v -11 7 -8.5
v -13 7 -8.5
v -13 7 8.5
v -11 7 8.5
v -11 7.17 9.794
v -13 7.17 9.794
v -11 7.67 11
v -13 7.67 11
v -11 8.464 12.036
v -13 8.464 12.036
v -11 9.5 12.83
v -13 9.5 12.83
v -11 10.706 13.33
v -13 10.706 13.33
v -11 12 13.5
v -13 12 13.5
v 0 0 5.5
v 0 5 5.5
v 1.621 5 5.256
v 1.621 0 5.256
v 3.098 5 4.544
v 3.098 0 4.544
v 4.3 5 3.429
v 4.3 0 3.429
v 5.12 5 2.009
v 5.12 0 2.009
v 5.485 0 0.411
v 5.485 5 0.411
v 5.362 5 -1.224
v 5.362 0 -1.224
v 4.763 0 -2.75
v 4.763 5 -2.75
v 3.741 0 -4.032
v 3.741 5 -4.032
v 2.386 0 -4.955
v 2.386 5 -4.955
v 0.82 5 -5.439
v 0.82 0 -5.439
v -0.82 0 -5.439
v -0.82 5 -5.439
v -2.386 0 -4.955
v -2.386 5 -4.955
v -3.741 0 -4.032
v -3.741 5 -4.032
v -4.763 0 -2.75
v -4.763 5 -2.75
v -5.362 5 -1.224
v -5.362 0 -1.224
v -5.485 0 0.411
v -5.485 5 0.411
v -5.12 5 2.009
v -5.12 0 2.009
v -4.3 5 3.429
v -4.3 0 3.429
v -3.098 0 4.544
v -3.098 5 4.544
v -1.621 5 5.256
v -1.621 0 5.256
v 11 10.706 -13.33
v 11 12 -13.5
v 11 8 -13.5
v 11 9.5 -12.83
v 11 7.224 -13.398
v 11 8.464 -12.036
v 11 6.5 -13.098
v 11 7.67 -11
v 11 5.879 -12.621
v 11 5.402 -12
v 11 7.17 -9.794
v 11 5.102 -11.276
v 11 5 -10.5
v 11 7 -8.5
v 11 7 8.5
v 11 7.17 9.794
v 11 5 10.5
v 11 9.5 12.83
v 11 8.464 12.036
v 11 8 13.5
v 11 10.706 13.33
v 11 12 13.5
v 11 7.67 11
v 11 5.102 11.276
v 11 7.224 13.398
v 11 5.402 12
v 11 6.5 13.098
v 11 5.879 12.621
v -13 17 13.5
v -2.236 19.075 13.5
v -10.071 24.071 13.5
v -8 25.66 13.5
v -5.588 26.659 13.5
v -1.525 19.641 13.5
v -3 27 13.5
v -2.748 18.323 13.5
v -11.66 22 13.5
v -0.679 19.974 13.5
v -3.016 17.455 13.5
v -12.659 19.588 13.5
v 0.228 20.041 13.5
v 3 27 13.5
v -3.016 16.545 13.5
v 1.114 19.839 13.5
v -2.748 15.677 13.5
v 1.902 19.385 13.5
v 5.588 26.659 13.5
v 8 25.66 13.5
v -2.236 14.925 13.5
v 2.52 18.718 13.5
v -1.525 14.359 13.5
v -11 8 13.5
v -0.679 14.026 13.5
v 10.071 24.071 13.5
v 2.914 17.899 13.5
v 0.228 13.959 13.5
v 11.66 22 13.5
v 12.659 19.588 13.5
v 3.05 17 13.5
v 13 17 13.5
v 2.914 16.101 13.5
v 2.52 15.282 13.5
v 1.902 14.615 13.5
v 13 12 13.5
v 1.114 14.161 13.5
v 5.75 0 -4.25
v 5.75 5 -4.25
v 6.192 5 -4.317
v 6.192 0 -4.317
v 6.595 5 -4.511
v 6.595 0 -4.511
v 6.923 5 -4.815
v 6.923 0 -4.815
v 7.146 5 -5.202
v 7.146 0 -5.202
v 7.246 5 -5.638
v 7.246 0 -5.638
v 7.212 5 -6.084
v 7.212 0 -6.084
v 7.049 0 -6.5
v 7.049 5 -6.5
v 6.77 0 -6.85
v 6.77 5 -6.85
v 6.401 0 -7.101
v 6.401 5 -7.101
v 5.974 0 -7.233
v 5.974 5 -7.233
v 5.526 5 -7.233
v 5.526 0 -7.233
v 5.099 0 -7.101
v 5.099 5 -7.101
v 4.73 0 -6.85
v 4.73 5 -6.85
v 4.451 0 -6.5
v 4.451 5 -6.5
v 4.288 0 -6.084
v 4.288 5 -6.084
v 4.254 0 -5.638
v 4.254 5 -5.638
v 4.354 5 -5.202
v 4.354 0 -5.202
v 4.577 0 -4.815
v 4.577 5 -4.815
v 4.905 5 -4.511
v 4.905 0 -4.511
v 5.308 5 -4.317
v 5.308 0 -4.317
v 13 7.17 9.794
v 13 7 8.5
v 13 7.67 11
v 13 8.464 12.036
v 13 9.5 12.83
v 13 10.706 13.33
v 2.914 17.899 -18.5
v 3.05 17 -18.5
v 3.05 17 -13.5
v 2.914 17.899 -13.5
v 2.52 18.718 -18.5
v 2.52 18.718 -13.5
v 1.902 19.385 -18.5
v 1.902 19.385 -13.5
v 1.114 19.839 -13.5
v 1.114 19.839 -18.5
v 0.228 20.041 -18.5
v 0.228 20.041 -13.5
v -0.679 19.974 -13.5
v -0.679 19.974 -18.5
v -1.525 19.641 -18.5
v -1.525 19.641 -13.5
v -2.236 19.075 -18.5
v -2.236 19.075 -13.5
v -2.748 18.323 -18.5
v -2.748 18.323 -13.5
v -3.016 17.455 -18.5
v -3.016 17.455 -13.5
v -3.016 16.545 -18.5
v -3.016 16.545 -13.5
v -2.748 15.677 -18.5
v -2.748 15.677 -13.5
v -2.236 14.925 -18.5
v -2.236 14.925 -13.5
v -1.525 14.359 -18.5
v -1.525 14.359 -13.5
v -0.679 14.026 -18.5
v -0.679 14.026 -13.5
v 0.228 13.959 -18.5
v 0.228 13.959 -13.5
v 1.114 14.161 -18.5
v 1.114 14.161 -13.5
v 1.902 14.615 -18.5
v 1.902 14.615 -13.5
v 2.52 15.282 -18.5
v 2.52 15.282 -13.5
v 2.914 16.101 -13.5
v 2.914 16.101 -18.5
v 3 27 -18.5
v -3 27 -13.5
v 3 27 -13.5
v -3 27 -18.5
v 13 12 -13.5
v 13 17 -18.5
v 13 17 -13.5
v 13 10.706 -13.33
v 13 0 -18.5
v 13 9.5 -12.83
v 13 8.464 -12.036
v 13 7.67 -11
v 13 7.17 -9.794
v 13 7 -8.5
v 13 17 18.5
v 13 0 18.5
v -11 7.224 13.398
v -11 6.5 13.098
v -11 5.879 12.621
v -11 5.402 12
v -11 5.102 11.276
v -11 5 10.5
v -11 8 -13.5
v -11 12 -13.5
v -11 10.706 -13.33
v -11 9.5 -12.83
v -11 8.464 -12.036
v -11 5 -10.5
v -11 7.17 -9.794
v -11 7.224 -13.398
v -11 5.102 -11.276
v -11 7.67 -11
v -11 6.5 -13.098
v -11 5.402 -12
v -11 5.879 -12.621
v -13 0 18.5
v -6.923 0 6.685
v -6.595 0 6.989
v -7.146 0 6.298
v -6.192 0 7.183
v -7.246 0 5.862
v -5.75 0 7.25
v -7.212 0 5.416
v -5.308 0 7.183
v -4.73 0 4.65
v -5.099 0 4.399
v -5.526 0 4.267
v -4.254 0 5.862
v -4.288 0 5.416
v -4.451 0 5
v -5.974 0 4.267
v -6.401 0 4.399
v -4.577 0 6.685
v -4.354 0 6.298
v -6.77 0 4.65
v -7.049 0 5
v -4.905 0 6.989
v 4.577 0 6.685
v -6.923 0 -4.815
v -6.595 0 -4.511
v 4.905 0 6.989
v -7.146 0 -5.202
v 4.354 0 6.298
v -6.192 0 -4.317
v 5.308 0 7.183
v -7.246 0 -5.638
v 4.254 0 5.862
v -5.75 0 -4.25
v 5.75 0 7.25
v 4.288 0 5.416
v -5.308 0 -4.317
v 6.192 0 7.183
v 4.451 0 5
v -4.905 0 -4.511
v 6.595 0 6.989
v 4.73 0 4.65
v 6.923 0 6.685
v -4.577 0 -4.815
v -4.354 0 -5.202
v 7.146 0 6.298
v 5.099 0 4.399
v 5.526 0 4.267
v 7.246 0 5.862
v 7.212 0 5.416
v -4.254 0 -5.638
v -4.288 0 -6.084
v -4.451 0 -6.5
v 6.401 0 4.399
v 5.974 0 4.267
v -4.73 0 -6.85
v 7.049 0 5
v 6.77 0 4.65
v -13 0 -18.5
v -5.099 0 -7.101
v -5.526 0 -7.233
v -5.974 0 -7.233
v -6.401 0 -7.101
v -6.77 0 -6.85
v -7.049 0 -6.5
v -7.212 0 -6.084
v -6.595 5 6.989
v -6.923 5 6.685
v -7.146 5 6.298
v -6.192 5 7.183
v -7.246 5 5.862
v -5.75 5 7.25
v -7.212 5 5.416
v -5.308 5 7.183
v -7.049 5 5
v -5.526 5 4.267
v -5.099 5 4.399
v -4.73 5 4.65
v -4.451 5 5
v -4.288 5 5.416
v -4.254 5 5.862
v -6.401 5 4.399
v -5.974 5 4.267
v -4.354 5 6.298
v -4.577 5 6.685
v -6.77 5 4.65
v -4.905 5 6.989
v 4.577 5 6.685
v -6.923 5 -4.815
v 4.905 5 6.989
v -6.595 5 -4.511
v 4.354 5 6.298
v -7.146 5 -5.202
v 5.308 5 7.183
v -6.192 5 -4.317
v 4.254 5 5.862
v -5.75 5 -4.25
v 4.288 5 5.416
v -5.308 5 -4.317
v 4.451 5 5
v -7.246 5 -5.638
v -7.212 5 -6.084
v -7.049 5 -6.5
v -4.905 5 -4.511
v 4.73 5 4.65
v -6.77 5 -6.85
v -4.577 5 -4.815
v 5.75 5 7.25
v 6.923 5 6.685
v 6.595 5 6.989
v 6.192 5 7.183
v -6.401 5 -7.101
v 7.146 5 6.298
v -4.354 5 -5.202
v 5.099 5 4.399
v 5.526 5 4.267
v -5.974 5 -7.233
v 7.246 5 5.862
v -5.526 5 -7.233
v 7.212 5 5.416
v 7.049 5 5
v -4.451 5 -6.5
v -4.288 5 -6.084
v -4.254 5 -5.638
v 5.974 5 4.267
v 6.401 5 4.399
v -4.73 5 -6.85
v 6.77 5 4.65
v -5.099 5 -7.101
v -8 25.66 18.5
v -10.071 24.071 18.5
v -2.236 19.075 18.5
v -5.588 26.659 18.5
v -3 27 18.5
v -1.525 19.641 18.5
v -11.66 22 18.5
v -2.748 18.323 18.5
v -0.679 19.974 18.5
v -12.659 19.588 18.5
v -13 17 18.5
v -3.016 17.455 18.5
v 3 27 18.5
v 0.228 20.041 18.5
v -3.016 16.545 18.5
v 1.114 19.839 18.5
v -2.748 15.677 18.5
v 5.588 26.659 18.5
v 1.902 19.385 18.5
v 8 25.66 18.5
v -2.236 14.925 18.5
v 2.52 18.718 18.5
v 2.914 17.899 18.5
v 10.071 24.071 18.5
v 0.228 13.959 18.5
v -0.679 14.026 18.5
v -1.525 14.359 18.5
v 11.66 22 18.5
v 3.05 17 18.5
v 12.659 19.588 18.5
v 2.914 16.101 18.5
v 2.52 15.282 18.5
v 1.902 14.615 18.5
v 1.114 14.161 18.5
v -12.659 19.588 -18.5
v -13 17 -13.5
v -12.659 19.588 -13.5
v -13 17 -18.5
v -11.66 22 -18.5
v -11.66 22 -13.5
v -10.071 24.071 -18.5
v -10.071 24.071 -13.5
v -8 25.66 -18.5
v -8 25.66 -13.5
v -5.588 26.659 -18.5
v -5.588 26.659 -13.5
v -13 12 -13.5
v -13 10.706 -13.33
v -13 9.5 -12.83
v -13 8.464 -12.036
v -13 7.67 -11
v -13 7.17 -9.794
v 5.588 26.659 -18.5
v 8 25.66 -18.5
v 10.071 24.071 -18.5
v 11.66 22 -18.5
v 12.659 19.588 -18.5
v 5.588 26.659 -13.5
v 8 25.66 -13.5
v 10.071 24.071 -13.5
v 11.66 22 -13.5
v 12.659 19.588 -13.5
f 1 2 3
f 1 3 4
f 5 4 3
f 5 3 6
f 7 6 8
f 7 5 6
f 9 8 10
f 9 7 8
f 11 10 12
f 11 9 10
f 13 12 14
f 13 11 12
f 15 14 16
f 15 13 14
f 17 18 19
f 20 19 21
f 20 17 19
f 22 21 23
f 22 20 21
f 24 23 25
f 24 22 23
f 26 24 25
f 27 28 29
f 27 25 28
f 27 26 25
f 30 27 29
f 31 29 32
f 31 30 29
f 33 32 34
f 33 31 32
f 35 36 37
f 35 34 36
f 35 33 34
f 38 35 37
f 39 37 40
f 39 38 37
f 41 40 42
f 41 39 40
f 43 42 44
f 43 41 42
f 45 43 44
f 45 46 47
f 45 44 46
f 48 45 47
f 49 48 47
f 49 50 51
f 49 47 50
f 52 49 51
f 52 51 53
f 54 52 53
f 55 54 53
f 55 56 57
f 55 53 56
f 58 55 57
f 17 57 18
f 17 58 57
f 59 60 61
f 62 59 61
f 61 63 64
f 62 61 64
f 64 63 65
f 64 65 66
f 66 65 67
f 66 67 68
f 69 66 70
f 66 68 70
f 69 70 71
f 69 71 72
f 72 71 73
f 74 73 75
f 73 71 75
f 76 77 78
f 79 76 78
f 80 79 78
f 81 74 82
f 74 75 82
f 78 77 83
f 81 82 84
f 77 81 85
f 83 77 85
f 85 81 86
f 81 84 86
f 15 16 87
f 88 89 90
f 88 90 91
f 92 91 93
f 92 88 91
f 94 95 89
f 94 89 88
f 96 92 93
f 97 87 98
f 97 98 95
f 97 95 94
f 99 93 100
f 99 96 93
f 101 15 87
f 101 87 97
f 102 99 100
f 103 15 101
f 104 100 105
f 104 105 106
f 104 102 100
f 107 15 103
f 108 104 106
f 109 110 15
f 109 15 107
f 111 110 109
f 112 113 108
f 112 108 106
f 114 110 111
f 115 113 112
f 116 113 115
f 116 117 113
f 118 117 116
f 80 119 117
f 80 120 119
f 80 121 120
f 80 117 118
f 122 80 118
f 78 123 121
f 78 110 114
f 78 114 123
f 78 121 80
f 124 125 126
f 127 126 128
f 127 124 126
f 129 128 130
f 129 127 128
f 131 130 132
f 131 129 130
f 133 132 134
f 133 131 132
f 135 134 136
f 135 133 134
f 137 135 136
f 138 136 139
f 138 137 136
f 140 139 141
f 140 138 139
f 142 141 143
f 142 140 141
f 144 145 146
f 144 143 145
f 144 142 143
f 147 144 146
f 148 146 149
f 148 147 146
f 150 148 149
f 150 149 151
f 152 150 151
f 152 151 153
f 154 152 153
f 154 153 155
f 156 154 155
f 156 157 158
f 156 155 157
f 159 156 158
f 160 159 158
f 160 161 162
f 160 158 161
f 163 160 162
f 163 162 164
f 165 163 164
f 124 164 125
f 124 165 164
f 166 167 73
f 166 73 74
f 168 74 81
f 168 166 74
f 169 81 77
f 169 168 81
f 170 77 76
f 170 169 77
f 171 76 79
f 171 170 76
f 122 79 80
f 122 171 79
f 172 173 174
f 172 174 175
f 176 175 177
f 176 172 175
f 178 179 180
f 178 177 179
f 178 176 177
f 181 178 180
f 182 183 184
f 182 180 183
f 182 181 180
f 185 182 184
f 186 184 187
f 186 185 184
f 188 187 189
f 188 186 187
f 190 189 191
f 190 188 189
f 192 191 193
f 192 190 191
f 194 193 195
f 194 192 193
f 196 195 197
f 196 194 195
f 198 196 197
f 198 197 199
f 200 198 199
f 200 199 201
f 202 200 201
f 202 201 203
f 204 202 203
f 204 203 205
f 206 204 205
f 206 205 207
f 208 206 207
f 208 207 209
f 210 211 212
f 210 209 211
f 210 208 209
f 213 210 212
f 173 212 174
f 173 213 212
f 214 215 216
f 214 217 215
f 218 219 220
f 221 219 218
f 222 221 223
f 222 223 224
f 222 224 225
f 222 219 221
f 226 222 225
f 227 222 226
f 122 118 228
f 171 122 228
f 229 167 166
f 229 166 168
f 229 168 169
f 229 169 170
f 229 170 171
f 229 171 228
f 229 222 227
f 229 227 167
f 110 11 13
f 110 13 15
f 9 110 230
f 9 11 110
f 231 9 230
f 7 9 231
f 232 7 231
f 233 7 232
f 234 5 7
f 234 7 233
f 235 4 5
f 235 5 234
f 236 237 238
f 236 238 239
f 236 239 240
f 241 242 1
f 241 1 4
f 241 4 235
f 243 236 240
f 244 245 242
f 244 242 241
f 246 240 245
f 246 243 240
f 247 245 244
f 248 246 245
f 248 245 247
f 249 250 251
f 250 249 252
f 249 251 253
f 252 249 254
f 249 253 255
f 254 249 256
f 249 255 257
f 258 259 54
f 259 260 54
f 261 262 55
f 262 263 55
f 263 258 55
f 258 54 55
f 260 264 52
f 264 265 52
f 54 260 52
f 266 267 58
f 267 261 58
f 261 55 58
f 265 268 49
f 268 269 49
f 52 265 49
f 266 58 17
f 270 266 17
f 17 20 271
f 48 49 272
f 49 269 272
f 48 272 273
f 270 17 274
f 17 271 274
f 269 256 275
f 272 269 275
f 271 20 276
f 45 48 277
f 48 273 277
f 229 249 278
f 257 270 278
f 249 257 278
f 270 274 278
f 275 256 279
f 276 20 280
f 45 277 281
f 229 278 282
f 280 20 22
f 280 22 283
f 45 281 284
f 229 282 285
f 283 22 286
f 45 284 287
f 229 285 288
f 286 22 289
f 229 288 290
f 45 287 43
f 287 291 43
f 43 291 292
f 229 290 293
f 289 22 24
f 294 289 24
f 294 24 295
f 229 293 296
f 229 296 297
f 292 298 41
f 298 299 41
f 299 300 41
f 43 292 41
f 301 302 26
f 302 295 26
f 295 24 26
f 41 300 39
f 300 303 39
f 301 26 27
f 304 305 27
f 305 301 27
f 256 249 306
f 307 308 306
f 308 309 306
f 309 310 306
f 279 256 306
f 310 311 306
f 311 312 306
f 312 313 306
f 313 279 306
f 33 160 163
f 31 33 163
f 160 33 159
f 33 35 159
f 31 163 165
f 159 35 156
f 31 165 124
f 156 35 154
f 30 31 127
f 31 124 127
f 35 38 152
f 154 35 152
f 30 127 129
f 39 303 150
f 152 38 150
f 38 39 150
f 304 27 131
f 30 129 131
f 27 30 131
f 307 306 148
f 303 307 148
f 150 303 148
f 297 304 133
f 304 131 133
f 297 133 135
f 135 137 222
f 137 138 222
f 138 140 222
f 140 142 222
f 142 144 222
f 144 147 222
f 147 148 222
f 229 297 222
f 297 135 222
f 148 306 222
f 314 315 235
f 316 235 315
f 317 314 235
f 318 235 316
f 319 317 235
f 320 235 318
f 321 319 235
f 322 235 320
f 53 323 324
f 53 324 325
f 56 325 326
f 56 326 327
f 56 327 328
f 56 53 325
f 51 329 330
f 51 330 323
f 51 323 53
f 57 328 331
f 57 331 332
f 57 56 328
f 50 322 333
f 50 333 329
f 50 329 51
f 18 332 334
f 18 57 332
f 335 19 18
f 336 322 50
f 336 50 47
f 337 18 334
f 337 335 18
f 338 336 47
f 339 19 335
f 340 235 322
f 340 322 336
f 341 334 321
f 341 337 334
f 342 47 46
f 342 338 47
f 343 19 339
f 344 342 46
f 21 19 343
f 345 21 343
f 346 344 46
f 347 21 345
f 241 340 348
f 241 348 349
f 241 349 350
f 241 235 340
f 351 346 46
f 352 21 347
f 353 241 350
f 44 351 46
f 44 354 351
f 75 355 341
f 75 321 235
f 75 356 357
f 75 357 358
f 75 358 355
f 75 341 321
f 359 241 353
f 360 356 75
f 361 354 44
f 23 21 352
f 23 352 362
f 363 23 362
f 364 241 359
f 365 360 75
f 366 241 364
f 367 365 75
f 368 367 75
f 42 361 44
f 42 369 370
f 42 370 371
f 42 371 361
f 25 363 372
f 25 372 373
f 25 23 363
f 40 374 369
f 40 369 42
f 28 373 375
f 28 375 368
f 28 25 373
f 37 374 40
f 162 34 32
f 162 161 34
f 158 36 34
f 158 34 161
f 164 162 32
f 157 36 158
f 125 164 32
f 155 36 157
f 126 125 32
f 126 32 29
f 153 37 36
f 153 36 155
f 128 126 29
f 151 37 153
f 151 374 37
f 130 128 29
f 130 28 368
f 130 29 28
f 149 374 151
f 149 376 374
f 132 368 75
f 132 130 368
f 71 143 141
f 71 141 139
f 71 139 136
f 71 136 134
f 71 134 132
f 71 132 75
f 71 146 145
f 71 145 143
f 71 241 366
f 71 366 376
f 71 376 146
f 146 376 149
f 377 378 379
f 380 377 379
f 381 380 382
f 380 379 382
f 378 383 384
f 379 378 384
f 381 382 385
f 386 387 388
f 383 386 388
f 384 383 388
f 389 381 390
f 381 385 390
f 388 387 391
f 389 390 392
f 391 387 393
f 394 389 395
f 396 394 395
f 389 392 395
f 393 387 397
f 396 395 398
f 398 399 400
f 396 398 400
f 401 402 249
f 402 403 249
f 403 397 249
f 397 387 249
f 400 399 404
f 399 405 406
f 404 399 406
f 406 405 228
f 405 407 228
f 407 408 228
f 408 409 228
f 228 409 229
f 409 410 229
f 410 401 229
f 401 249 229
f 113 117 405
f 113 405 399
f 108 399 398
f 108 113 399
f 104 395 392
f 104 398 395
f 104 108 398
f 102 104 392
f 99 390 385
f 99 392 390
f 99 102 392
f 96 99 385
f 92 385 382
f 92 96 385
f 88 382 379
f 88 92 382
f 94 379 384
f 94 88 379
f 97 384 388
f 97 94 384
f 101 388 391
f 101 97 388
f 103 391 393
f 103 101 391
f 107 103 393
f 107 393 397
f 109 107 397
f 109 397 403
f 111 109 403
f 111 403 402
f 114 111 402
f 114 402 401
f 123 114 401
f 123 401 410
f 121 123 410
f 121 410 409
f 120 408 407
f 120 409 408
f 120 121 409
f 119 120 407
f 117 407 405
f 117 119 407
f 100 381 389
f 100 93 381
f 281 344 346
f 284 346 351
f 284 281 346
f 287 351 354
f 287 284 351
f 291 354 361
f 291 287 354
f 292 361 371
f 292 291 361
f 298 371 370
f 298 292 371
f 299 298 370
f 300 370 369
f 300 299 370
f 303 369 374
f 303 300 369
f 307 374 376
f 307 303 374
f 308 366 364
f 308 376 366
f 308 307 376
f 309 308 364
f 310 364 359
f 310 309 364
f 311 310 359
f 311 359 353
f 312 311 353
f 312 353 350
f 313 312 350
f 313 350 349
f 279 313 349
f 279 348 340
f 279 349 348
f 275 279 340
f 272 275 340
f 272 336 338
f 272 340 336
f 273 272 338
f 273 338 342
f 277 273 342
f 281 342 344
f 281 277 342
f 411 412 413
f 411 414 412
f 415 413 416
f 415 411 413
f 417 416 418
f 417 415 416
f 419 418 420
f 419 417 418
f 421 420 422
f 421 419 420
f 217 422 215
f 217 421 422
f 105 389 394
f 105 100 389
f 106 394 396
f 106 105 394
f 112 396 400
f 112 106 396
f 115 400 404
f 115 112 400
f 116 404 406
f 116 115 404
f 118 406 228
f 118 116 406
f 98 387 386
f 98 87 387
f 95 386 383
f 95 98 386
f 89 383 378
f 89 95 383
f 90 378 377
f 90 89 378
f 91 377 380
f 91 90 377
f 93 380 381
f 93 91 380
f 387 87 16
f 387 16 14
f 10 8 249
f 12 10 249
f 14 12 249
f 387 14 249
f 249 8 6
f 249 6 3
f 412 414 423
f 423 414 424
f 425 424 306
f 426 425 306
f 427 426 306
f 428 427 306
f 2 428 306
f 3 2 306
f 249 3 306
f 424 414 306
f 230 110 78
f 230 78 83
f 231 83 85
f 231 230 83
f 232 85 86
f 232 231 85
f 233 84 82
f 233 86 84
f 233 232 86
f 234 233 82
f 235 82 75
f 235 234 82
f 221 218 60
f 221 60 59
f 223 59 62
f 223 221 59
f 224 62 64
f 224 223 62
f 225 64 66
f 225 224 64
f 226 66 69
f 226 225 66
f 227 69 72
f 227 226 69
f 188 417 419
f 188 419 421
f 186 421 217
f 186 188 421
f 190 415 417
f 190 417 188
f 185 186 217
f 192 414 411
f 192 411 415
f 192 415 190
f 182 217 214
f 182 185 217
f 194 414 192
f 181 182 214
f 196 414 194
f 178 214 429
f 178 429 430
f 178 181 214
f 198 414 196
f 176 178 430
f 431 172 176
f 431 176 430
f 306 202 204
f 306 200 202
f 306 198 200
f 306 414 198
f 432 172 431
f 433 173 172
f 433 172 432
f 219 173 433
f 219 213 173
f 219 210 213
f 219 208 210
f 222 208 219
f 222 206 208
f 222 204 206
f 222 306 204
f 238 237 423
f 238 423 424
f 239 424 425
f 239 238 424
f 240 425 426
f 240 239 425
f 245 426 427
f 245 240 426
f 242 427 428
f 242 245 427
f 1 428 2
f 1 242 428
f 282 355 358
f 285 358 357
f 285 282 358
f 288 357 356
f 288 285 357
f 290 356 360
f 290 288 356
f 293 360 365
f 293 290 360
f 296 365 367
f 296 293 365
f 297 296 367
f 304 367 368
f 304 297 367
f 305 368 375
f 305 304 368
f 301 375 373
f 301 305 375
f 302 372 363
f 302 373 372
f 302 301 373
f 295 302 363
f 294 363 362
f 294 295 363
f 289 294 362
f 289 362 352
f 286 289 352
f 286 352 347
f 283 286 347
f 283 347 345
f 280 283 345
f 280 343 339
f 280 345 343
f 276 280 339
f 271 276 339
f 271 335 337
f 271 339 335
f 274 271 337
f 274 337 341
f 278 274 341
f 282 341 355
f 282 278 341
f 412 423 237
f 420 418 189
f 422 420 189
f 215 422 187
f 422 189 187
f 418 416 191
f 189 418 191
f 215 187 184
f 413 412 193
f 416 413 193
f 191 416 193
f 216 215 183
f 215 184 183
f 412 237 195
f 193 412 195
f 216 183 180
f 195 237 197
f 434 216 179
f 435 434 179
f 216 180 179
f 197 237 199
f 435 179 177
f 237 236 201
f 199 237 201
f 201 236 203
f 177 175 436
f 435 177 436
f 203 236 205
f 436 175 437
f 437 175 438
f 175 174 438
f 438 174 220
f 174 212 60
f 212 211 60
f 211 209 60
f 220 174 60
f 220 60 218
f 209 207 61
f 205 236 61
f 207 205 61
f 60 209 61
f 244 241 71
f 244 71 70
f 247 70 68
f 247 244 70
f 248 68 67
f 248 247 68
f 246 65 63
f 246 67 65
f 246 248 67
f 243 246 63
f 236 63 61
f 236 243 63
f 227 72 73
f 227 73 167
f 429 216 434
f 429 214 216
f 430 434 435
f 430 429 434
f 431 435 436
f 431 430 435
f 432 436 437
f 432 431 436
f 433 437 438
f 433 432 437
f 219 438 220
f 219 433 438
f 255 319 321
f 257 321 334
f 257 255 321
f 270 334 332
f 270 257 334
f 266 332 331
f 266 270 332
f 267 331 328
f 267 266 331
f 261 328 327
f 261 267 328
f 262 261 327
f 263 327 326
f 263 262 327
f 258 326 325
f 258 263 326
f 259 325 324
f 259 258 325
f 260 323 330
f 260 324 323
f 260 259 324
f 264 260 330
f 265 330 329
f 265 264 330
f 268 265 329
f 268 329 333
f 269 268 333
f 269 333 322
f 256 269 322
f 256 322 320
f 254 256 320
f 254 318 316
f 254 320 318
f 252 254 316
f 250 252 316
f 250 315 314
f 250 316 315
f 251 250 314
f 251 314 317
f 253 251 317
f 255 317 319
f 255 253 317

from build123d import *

# Parameters (mm, degrees)
SKETCH1_W               = 26
SKETCH1_H               = 37
BOSS_EXTRUDE1_DEPTH     = 5
SKETCH2_R               = 1.5
SKETCH2_R_2             = 5.5
CUT_EXTRUDE1_DEPTH      = 24.157072354
SKETCH3_W               = 26
SKETCH3_H               = 5
BOSS_EXTRUDE2_DEPTH     = 27
CUT_EXTRUDE2_DEPTH      = 36.217183306
CUT_EXTRUDE2_DEPTH_BACK = 36.217183306
SKETCH4_R               = 3.05
FILLET1_R               = 10
FILLET2_R               = 3
SKETCH5_W               = 2
SKETCH5_H               = 37
BOSS_EXTRUDE3_DEPTH     = 7
FILLET3_R               = 5


with BuildPart() as part:
    # Sketch1 → Boss-Extrude1 (new body)
    with BuildSketch(Plane(origin=(0, 0, 0), x_dir=(1, 0, 0), z_dir=(0, 1, 0))):
        Rectangle(SKETCH1_W, SKETCH1_H)
    extrude(amount=BOSS_EXTRUDE1_DEPTH)

    # Sketch2 → Cut-Extrude1 (cut, through all)
    with BuildSketch(Plane(origin=(0, 0, 0), x_dir=(1, 0, 0), z_dir=(0, 1, 0))):
        with Locations(Location((-5.75, 5.75, 0), (0, 0, 270))):
            Circle(SKETCH2_R)
        with Locations(Location((0, 0, 0), (0, 0, 270))):
            Circle(SKETCH2_R_2)
        with Locations(Location((5.75, 5.75, 0), (0, 0, 270))):
            Circle(SKETCH2_R)
        with Locations(Location((5.75, -5.75, 0), (0, 0, 270))):
            Circle(SKETCH2_R)
        with Locations(Location((-5.75, -5.75, 0), (0, 0, 270))):
            Circle(SKETCH2_R)
    extrude(amount=CUT_EXTRUDE1_DEPTH, mode=Mode.SUBTRACT)

    # Sketch3 → Boss-Extrude2 (add)
    with BuildSketch(Plane(origin=(0, 0, 0), x_dir=(1, 0, 0), z_dir=(0, 1, 0))):
        with Locations((0, 16)):
            Rectangle(SKETCH3_W, SKETCH3_H)
        with Locations((0, -16)):
            Rectangle(SKETCH3_W, SKETCH3_H)
    extrude(amount=BOSS_EXTRUDE2_DEPTH)

    # Sketch4 → Cut-Extrude2 (cut, two sides: drawn at the far end of the back side and taken through both)
    with BuildSketch(Plane.XY.offset(-CUT_EXTRUDE2_DEPTH_BACK)):
        with Locations((0, 17)):
            Circle(SKETCH4_R)
    extrude(amount=CUT_EXTRUDE2_DEPTH + CUT_EXTRUDE2_DEPTH_BACK, mode=Mode.SUBTRACT)

    # Fillet1
    fillet1_edges = [part.edges().sort_by_distance(p)[0] for p in [
        (-13, 27, -16),
        (13, 27, -16),
        (13, 27, 16),
        (-13, 27, 16),
    ]]
    fillet(fillet1_edges, radius=FILLET1_R)

    # Fillet2
    fillet2_edges = [part.edges().sort_by_distance(p)[0] for p in [
        (0, 5, -13.5),
        (0, 5, 13.5),
    ]]
    fillet(fillet2_edges, radius=FILLET2_R)

    # Sketch5 → Boss-Extrude3 (add)
    with BuildSketch(Plane(origin=(0, 0, 0), x_dir=(1, 0, 0), z_dir=(0, 1, 0))):
        with Locations((-12, 0)):
            Rectangle(SKETCH5_W, SKETCH5_H)
        with Locations((12, 0)):
            Rectangle(SKETCH5_W, SKETCH5_H)
    extrude(amount=BOSS_EXTRUDE3_DEPTH)

    # Fillet3
    # the kernel refuses this fillet: 5 mm, written as the material it adds along each edge
    with BuildSketch(Plane(origin=(13, 7, -13.328427125), x_dir=(0, 0, 1), z_dir=(-1, 0, 0))) as fillet3_piece_1:
        with BuildLine():
            CenterArc((4.828427125, 5), FILLET3_R, 180, 90)
            Line((-0.171572875, 5), (-0.671572875, 5))
            ThreePointArc((-0.671572875, 5), (-0.671572875, 1), (-0.471404521, -0.166666667))
            Line((-0.471404521, -0.166666667), (0, -0.5))
            Line((0, -0.5), (4.828427125, -0.5))
            Line((4.828427125, -0.5), (4.828427125, 0))
        make_face()
    extrude(amount=2)
    with BuildSketch(Plane(origin=(13, 7, 13.328427125), x_dir=(0, 0, -1), z_dir=(-1, 0, 0)), Plane(origin=(-11, 7, 13.328427125), x_dir=(0, 0, -1), z_dir=(-1, 0, 0))) as fillet3_piece_2:
        with BuildLine():
            CenterArc((4.828427125, -5), FILLET3_R, 90, 90)
            Line((-0.171572875, -5), (-0.671572875, -5))
            ThreePointArc((-0.671572875, -5), (-0.671572875, -1), (-0.471404521, 0.166666667))
            Line((-0.471404521, 0.166666667), (0, 0.5))
            Line((0, 0.5), (4.828427125, 0.5))
            Line((4.828427125, 0.5), (4.828427125, 0))
        make_face()
    extrude(amount=2)
    with BuildSketch(Plane(origin=(-11, 7, -13.328427125), x_dir=(0, 0.9994117743909562, -0.03429439033895371), z_dir=(-1, 0, 0))) as fillet3_piece_3:
        with BuildLine():
            CenterArc((4.831470907, -4.997058872), FILLET3_R, 88.034690809, 90)
            Line((-0.165587965, -4.82558692), (-0.665293852, -4.808439725))
            Line((-0.665293852, -4.808439725), (-0.499705887, 0.017147195))
            Line((-0.499705887, 0.017147195), (-0.150402098, 0.47684296))
            ThreePointArc((-0.150402098, 0.47684296), (1.022442957, 0.636883449), (5.020090054, 0.499705887))
            Line((5.020090054, 0.499705887), (5.002942859, 0))
        make_face()
    extrude(amount=2)


solid = part.part
